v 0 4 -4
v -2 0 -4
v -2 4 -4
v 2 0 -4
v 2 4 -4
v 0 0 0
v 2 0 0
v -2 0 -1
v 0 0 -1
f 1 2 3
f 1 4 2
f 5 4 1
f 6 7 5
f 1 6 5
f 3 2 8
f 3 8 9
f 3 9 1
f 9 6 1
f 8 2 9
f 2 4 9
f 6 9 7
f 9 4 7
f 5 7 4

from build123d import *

# Parameters (mm, degrees)
SKETCH1_W           = 4
SKETCH1_H           = 4
BOSS_EXTRUDE1_DEPTH = 2
SKETCH2_W           = 3
SKETCH2_H           = 4
BOSS_EXTRUDE2_DEPTH = 2
CUT_EXTRUDE1_DEPTH  = 2
CUT_EXTRUDE2_DEPTH  = 2


with BuildPart() as part:
    # Sketch1 → Boss-Extrude1 (new body)
    with BuildSketch(Plane(origin=(0, 0, 0), x_dir=(0, 0, -1), z_dir=(1, 0, 0))):
        with Locations((2, 2)):
            Rectangle(SKETCH1_W, SKETCH1_H)
    extrude(amount=BOSS_EXTRUDE1_DEPTH)

    # Sketch2 → Boss-Extrude2 (add)
    with BuildSketch(Plane.ZY):
        with Locations((-2.5, 2)):
            Rectangle(SKETCH2_W, SKETCH2_H)
    extrude(amount=BOSS_EXTRUDE2_DEPTH)

    # Sketch3 → Cut-Extrude1 (cut)
    with BuildSketch(Plane(origin=(2, 0, 0), x_dir=(0, 0, -1), z_dir=(1, 0, 0))):
        Polygon((0, 0), (4, 4), (0, 4), align=None)
    extrude(amount=-CUT_EXTRUDE1_DEPTH, mode=Mode.SUBTRACT)

    # Sketch4 → Cut-Extrude2 (cut)
    with BuildSketch(Plane.ZY.offset(2)):
        Polygon((-1, 0), (-4, 4), (-1, 4), align=None)
    extrude(amount=-CUT_EXTRUDE2_DEPTH, mode=Mode.SUBTRACT)


solid = part.part
